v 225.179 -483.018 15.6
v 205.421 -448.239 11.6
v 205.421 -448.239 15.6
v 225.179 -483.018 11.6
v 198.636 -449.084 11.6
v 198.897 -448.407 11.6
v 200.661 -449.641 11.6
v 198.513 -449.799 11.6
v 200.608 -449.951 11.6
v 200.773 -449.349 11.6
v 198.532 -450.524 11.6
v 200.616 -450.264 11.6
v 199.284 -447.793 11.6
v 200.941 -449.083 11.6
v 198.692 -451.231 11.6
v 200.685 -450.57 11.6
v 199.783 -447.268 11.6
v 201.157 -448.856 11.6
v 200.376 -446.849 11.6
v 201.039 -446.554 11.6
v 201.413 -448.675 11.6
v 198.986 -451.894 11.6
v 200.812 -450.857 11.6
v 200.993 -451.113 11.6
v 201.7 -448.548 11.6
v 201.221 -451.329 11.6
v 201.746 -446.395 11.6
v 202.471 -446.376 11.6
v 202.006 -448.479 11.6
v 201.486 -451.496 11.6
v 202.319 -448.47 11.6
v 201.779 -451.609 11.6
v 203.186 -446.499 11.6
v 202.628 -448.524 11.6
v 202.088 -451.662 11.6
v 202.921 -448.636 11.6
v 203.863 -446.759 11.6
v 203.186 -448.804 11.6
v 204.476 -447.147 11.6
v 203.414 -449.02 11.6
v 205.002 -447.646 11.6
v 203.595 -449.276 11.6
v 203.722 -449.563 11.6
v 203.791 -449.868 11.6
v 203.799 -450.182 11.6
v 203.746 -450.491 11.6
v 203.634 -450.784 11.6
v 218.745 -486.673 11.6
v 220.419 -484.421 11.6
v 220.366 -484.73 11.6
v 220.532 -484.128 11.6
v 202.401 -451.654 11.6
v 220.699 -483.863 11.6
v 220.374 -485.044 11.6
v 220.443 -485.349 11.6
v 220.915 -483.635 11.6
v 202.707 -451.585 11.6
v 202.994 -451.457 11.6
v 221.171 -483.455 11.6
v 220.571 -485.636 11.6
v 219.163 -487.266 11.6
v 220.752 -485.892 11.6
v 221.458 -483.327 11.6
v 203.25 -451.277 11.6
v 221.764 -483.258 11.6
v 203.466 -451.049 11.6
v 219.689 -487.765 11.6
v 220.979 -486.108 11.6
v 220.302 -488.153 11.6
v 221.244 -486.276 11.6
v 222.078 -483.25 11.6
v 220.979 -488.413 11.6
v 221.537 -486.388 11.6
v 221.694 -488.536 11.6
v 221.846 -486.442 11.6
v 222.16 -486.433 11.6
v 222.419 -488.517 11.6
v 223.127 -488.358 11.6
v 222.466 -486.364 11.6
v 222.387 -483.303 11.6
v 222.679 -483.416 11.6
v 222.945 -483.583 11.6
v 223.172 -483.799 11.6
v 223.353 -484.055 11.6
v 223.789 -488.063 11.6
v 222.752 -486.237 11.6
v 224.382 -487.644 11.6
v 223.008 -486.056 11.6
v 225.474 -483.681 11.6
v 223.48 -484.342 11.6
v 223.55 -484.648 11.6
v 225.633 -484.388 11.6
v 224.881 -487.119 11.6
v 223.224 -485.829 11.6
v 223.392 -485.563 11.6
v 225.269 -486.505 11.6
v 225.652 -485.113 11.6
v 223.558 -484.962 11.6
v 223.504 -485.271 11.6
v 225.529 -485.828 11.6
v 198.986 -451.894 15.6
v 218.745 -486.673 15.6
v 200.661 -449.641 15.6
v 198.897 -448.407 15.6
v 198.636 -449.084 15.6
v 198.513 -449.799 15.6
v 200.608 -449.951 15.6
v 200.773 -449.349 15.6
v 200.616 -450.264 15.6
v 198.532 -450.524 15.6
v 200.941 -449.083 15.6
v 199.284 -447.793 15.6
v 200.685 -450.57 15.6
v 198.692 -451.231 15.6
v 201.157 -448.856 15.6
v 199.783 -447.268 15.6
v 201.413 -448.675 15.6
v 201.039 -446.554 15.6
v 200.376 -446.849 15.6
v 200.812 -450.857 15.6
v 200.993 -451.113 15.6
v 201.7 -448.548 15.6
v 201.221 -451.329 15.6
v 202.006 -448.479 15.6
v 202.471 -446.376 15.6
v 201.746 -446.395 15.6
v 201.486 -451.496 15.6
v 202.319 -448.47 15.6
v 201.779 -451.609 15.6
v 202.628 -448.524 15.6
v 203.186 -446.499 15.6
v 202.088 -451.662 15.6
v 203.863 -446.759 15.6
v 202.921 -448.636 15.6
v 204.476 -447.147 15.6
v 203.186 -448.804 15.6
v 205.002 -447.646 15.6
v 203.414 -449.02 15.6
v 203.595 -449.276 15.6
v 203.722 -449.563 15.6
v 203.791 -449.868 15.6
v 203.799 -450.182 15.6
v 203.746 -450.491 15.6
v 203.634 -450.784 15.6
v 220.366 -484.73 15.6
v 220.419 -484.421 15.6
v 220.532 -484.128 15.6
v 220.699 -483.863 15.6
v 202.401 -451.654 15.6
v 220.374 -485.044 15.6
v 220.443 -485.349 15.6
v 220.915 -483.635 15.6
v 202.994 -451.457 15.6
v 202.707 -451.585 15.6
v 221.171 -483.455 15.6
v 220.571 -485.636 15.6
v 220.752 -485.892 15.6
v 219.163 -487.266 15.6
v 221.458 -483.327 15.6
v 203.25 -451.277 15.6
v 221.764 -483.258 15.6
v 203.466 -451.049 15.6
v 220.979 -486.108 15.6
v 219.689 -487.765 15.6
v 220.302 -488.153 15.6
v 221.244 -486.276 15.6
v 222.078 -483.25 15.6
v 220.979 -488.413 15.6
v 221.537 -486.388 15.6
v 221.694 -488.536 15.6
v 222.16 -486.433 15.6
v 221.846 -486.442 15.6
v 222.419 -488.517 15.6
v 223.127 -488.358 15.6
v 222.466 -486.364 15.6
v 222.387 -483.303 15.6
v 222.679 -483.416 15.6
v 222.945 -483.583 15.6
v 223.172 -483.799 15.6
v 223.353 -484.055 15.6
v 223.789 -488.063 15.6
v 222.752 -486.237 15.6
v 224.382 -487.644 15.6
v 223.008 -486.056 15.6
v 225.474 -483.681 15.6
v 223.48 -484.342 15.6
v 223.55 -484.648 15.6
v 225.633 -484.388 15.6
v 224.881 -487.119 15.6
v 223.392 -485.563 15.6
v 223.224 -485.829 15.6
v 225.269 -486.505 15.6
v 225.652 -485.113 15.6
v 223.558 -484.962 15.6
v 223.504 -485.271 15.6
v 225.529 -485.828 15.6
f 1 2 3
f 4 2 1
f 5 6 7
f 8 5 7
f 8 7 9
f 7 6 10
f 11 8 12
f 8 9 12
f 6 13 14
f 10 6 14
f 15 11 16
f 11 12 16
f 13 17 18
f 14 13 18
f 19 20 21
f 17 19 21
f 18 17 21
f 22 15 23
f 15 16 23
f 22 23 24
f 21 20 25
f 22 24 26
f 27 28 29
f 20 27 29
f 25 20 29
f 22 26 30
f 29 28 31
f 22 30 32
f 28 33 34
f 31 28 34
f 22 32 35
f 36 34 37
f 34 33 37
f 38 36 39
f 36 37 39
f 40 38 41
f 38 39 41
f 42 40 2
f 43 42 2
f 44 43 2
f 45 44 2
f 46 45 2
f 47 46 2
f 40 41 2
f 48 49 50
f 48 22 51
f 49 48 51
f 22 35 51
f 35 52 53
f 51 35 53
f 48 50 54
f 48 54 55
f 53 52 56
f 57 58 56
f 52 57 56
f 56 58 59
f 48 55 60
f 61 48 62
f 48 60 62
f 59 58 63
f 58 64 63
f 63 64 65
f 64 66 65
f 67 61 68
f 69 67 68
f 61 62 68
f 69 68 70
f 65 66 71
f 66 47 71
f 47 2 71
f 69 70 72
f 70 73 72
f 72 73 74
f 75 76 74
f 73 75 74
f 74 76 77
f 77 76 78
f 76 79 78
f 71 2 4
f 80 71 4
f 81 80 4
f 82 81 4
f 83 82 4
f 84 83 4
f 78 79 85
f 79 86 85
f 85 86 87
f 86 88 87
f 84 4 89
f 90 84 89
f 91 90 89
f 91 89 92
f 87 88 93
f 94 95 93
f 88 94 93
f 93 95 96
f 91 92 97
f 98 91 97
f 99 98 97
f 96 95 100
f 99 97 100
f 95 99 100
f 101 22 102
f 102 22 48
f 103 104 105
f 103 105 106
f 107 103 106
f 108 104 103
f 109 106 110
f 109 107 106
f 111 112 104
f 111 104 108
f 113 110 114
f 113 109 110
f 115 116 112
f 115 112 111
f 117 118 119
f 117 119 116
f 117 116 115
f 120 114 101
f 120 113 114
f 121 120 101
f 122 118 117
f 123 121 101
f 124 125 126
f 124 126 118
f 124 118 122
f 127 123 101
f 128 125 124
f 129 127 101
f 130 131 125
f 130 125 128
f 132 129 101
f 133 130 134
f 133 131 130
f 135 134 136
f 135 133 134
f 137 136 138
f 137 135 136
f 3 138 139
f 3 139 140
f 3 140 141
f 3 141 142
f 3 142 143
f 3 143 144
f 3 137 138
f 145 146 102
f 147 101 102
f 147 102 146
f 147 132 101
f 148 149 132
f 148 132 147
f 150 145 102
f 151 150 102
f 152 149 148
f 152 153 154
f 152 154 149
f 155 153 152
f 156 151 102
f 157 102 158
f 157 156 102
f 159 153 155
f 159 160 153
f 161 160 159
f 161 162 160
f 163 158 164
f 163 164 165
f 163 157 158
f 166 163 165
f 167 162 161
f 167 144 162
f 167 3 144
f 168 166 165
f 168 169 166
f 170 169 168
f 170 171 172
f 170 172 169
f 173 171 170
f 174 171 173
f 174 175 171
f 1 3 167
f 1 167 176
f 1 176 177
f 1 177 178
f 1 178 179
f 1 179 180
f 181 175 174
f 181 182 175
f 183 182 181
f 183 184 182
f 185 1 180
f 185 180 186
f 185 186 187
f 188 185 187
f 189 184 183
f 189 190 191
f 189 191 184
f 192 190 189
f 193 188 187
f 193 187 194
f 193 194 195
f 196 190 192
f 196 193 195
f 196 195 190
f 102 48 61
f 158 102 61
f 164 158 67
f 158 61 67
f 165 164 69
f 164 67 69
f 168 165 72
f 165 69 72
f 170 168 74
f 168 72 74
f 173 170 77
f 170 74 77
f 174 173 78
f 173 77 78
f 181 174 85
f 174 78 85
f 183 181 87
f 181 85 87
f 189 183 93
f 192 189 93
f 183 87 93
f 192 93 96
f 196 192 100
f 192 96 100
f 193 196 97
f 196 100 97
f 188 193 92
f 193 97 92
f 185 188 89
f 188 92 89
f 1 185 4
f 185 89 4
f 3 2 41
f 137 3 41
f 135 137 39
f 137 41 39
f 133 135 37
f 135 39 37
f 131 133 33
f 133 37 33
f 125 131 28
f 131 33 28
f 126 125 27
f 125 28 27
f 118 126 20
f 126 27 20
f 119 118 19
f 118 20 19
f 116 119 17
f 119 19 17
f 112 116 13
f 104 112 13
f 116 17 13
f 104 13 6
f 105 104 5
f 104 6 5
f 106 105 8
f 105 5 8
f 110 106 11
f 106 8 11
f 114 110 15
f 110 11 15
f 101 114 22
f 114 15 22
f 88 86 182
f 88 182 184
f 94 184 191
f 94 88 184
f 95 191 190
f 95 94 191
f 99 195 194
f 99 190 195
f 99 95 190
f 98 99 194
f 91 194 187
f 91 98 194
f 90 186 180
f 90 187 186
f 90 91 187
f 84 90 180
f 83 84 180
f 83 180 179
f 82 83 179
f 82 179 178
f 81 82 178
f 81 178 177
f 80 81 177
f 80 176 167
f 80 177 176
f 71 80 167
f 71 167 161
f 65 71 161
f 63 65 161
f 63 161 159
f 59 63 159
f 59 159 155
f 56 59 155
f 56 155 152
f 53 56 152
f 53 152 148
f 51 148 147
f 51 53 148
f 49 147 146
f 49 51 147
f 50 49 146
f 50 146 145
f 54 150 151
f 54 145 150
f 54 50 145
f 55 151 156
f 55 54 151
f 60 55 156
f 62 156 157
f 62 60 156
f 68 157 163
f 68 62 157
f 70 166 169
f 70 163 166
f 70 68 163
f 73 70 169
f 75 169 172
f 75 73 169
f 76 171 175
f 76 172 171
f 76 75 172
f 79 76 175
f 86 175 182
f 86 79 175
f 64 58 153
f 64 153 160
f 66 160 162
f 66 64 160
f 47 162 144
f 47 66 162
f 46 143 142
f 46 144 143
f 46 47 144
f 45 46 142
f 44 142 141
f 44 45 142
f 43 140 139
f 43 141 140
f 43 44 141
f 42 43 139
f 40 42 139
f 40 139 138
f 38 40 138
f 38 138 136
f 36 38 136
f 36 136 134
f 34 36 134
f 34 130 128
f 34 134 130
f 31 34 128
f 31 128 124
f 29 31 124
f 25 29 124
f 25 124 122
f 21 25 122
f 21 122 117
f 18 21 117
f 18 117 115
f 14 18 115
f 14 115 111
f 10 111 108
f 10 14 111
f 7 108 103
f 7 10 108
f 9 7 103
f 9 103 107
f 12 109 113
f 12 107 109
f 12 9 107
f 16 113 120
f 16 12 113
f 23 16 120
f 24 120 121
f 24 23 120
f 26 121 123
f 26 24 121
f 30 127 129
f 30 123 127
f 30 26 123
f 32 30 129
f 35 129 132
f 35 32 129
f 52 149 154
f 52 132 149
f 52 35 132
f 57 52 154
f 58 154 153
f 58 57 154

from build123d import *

# Parameters (mm, degrees)
CYLINDER005_R            = 1.6
CYLINDER005_DEPTH        = 30
PAD002_DEPTH             = 4
CLONE017_PLACEMENT_ANGLE = 60.399047773


with BuildPart() as finger_drill_master:
    # Cylinder005 → Cylinder005 (new body)
    with BuildSketch(Plane.XY.offset(-8)):
        Circle(CYLINDER005_R)
    extrude(amount=CYLINDER005_DEPTH)


with BuildPart() as clone006:
    # Clone006 base: copy of finger-drill-master
    add(finger_drill_master.part)


with BuildPart() as clone006_1:
    # Clone006 placement: moved
    add(clone006.part.moved(Location((40, 0, 0))))


with BuildPart() as fusion012:
    # Clone005 base: copy of finger-drill-master
    add(finger_drill_master.part)

    # Fusion012: union Clone006
    add(clone006_1.part)


with BuildPart() as clone_of_right_link:
    # Sketch002 → Pad002 (new body)
    with BuildSketch(Plane.XY):
        with BuildLine():
            ThreePointArc((0, 3.7), (-3.7, 0), (0, -3.7))
            Line((0, -3.7), (40, -3.7))
            ThreePointArc((40, -3.7), (43.7, 0), (40, 3.7))
            Line((0, 3.7), (40, 3.7))
        make_face()
    extrude(amount=PAD002_DEPTH)

    # Cut001: cut Fusion012
    add(fusion012.part, mode=Mode.SUBTRACT)


with BuildPart() as clone_of_right_link_1:
    # Clone017 placement: moved
    add(clone_of_right_link.part.moved(Location((216.2035278557, 248.9337248036, 4.3))).rotate(Axis((216.2035278557, 248.9337248036, 4.3), (0, 0, -1)), CLONE017_PLACEMENT_ANGLE))


with BuildPart() as clone_of_right_link_2:
    # Clone182 placement: moved
    add(clone_of_right_link_1.part.moved(Location((-14, -699, 7.3))))


solid = clone_of_right_link_2.part
